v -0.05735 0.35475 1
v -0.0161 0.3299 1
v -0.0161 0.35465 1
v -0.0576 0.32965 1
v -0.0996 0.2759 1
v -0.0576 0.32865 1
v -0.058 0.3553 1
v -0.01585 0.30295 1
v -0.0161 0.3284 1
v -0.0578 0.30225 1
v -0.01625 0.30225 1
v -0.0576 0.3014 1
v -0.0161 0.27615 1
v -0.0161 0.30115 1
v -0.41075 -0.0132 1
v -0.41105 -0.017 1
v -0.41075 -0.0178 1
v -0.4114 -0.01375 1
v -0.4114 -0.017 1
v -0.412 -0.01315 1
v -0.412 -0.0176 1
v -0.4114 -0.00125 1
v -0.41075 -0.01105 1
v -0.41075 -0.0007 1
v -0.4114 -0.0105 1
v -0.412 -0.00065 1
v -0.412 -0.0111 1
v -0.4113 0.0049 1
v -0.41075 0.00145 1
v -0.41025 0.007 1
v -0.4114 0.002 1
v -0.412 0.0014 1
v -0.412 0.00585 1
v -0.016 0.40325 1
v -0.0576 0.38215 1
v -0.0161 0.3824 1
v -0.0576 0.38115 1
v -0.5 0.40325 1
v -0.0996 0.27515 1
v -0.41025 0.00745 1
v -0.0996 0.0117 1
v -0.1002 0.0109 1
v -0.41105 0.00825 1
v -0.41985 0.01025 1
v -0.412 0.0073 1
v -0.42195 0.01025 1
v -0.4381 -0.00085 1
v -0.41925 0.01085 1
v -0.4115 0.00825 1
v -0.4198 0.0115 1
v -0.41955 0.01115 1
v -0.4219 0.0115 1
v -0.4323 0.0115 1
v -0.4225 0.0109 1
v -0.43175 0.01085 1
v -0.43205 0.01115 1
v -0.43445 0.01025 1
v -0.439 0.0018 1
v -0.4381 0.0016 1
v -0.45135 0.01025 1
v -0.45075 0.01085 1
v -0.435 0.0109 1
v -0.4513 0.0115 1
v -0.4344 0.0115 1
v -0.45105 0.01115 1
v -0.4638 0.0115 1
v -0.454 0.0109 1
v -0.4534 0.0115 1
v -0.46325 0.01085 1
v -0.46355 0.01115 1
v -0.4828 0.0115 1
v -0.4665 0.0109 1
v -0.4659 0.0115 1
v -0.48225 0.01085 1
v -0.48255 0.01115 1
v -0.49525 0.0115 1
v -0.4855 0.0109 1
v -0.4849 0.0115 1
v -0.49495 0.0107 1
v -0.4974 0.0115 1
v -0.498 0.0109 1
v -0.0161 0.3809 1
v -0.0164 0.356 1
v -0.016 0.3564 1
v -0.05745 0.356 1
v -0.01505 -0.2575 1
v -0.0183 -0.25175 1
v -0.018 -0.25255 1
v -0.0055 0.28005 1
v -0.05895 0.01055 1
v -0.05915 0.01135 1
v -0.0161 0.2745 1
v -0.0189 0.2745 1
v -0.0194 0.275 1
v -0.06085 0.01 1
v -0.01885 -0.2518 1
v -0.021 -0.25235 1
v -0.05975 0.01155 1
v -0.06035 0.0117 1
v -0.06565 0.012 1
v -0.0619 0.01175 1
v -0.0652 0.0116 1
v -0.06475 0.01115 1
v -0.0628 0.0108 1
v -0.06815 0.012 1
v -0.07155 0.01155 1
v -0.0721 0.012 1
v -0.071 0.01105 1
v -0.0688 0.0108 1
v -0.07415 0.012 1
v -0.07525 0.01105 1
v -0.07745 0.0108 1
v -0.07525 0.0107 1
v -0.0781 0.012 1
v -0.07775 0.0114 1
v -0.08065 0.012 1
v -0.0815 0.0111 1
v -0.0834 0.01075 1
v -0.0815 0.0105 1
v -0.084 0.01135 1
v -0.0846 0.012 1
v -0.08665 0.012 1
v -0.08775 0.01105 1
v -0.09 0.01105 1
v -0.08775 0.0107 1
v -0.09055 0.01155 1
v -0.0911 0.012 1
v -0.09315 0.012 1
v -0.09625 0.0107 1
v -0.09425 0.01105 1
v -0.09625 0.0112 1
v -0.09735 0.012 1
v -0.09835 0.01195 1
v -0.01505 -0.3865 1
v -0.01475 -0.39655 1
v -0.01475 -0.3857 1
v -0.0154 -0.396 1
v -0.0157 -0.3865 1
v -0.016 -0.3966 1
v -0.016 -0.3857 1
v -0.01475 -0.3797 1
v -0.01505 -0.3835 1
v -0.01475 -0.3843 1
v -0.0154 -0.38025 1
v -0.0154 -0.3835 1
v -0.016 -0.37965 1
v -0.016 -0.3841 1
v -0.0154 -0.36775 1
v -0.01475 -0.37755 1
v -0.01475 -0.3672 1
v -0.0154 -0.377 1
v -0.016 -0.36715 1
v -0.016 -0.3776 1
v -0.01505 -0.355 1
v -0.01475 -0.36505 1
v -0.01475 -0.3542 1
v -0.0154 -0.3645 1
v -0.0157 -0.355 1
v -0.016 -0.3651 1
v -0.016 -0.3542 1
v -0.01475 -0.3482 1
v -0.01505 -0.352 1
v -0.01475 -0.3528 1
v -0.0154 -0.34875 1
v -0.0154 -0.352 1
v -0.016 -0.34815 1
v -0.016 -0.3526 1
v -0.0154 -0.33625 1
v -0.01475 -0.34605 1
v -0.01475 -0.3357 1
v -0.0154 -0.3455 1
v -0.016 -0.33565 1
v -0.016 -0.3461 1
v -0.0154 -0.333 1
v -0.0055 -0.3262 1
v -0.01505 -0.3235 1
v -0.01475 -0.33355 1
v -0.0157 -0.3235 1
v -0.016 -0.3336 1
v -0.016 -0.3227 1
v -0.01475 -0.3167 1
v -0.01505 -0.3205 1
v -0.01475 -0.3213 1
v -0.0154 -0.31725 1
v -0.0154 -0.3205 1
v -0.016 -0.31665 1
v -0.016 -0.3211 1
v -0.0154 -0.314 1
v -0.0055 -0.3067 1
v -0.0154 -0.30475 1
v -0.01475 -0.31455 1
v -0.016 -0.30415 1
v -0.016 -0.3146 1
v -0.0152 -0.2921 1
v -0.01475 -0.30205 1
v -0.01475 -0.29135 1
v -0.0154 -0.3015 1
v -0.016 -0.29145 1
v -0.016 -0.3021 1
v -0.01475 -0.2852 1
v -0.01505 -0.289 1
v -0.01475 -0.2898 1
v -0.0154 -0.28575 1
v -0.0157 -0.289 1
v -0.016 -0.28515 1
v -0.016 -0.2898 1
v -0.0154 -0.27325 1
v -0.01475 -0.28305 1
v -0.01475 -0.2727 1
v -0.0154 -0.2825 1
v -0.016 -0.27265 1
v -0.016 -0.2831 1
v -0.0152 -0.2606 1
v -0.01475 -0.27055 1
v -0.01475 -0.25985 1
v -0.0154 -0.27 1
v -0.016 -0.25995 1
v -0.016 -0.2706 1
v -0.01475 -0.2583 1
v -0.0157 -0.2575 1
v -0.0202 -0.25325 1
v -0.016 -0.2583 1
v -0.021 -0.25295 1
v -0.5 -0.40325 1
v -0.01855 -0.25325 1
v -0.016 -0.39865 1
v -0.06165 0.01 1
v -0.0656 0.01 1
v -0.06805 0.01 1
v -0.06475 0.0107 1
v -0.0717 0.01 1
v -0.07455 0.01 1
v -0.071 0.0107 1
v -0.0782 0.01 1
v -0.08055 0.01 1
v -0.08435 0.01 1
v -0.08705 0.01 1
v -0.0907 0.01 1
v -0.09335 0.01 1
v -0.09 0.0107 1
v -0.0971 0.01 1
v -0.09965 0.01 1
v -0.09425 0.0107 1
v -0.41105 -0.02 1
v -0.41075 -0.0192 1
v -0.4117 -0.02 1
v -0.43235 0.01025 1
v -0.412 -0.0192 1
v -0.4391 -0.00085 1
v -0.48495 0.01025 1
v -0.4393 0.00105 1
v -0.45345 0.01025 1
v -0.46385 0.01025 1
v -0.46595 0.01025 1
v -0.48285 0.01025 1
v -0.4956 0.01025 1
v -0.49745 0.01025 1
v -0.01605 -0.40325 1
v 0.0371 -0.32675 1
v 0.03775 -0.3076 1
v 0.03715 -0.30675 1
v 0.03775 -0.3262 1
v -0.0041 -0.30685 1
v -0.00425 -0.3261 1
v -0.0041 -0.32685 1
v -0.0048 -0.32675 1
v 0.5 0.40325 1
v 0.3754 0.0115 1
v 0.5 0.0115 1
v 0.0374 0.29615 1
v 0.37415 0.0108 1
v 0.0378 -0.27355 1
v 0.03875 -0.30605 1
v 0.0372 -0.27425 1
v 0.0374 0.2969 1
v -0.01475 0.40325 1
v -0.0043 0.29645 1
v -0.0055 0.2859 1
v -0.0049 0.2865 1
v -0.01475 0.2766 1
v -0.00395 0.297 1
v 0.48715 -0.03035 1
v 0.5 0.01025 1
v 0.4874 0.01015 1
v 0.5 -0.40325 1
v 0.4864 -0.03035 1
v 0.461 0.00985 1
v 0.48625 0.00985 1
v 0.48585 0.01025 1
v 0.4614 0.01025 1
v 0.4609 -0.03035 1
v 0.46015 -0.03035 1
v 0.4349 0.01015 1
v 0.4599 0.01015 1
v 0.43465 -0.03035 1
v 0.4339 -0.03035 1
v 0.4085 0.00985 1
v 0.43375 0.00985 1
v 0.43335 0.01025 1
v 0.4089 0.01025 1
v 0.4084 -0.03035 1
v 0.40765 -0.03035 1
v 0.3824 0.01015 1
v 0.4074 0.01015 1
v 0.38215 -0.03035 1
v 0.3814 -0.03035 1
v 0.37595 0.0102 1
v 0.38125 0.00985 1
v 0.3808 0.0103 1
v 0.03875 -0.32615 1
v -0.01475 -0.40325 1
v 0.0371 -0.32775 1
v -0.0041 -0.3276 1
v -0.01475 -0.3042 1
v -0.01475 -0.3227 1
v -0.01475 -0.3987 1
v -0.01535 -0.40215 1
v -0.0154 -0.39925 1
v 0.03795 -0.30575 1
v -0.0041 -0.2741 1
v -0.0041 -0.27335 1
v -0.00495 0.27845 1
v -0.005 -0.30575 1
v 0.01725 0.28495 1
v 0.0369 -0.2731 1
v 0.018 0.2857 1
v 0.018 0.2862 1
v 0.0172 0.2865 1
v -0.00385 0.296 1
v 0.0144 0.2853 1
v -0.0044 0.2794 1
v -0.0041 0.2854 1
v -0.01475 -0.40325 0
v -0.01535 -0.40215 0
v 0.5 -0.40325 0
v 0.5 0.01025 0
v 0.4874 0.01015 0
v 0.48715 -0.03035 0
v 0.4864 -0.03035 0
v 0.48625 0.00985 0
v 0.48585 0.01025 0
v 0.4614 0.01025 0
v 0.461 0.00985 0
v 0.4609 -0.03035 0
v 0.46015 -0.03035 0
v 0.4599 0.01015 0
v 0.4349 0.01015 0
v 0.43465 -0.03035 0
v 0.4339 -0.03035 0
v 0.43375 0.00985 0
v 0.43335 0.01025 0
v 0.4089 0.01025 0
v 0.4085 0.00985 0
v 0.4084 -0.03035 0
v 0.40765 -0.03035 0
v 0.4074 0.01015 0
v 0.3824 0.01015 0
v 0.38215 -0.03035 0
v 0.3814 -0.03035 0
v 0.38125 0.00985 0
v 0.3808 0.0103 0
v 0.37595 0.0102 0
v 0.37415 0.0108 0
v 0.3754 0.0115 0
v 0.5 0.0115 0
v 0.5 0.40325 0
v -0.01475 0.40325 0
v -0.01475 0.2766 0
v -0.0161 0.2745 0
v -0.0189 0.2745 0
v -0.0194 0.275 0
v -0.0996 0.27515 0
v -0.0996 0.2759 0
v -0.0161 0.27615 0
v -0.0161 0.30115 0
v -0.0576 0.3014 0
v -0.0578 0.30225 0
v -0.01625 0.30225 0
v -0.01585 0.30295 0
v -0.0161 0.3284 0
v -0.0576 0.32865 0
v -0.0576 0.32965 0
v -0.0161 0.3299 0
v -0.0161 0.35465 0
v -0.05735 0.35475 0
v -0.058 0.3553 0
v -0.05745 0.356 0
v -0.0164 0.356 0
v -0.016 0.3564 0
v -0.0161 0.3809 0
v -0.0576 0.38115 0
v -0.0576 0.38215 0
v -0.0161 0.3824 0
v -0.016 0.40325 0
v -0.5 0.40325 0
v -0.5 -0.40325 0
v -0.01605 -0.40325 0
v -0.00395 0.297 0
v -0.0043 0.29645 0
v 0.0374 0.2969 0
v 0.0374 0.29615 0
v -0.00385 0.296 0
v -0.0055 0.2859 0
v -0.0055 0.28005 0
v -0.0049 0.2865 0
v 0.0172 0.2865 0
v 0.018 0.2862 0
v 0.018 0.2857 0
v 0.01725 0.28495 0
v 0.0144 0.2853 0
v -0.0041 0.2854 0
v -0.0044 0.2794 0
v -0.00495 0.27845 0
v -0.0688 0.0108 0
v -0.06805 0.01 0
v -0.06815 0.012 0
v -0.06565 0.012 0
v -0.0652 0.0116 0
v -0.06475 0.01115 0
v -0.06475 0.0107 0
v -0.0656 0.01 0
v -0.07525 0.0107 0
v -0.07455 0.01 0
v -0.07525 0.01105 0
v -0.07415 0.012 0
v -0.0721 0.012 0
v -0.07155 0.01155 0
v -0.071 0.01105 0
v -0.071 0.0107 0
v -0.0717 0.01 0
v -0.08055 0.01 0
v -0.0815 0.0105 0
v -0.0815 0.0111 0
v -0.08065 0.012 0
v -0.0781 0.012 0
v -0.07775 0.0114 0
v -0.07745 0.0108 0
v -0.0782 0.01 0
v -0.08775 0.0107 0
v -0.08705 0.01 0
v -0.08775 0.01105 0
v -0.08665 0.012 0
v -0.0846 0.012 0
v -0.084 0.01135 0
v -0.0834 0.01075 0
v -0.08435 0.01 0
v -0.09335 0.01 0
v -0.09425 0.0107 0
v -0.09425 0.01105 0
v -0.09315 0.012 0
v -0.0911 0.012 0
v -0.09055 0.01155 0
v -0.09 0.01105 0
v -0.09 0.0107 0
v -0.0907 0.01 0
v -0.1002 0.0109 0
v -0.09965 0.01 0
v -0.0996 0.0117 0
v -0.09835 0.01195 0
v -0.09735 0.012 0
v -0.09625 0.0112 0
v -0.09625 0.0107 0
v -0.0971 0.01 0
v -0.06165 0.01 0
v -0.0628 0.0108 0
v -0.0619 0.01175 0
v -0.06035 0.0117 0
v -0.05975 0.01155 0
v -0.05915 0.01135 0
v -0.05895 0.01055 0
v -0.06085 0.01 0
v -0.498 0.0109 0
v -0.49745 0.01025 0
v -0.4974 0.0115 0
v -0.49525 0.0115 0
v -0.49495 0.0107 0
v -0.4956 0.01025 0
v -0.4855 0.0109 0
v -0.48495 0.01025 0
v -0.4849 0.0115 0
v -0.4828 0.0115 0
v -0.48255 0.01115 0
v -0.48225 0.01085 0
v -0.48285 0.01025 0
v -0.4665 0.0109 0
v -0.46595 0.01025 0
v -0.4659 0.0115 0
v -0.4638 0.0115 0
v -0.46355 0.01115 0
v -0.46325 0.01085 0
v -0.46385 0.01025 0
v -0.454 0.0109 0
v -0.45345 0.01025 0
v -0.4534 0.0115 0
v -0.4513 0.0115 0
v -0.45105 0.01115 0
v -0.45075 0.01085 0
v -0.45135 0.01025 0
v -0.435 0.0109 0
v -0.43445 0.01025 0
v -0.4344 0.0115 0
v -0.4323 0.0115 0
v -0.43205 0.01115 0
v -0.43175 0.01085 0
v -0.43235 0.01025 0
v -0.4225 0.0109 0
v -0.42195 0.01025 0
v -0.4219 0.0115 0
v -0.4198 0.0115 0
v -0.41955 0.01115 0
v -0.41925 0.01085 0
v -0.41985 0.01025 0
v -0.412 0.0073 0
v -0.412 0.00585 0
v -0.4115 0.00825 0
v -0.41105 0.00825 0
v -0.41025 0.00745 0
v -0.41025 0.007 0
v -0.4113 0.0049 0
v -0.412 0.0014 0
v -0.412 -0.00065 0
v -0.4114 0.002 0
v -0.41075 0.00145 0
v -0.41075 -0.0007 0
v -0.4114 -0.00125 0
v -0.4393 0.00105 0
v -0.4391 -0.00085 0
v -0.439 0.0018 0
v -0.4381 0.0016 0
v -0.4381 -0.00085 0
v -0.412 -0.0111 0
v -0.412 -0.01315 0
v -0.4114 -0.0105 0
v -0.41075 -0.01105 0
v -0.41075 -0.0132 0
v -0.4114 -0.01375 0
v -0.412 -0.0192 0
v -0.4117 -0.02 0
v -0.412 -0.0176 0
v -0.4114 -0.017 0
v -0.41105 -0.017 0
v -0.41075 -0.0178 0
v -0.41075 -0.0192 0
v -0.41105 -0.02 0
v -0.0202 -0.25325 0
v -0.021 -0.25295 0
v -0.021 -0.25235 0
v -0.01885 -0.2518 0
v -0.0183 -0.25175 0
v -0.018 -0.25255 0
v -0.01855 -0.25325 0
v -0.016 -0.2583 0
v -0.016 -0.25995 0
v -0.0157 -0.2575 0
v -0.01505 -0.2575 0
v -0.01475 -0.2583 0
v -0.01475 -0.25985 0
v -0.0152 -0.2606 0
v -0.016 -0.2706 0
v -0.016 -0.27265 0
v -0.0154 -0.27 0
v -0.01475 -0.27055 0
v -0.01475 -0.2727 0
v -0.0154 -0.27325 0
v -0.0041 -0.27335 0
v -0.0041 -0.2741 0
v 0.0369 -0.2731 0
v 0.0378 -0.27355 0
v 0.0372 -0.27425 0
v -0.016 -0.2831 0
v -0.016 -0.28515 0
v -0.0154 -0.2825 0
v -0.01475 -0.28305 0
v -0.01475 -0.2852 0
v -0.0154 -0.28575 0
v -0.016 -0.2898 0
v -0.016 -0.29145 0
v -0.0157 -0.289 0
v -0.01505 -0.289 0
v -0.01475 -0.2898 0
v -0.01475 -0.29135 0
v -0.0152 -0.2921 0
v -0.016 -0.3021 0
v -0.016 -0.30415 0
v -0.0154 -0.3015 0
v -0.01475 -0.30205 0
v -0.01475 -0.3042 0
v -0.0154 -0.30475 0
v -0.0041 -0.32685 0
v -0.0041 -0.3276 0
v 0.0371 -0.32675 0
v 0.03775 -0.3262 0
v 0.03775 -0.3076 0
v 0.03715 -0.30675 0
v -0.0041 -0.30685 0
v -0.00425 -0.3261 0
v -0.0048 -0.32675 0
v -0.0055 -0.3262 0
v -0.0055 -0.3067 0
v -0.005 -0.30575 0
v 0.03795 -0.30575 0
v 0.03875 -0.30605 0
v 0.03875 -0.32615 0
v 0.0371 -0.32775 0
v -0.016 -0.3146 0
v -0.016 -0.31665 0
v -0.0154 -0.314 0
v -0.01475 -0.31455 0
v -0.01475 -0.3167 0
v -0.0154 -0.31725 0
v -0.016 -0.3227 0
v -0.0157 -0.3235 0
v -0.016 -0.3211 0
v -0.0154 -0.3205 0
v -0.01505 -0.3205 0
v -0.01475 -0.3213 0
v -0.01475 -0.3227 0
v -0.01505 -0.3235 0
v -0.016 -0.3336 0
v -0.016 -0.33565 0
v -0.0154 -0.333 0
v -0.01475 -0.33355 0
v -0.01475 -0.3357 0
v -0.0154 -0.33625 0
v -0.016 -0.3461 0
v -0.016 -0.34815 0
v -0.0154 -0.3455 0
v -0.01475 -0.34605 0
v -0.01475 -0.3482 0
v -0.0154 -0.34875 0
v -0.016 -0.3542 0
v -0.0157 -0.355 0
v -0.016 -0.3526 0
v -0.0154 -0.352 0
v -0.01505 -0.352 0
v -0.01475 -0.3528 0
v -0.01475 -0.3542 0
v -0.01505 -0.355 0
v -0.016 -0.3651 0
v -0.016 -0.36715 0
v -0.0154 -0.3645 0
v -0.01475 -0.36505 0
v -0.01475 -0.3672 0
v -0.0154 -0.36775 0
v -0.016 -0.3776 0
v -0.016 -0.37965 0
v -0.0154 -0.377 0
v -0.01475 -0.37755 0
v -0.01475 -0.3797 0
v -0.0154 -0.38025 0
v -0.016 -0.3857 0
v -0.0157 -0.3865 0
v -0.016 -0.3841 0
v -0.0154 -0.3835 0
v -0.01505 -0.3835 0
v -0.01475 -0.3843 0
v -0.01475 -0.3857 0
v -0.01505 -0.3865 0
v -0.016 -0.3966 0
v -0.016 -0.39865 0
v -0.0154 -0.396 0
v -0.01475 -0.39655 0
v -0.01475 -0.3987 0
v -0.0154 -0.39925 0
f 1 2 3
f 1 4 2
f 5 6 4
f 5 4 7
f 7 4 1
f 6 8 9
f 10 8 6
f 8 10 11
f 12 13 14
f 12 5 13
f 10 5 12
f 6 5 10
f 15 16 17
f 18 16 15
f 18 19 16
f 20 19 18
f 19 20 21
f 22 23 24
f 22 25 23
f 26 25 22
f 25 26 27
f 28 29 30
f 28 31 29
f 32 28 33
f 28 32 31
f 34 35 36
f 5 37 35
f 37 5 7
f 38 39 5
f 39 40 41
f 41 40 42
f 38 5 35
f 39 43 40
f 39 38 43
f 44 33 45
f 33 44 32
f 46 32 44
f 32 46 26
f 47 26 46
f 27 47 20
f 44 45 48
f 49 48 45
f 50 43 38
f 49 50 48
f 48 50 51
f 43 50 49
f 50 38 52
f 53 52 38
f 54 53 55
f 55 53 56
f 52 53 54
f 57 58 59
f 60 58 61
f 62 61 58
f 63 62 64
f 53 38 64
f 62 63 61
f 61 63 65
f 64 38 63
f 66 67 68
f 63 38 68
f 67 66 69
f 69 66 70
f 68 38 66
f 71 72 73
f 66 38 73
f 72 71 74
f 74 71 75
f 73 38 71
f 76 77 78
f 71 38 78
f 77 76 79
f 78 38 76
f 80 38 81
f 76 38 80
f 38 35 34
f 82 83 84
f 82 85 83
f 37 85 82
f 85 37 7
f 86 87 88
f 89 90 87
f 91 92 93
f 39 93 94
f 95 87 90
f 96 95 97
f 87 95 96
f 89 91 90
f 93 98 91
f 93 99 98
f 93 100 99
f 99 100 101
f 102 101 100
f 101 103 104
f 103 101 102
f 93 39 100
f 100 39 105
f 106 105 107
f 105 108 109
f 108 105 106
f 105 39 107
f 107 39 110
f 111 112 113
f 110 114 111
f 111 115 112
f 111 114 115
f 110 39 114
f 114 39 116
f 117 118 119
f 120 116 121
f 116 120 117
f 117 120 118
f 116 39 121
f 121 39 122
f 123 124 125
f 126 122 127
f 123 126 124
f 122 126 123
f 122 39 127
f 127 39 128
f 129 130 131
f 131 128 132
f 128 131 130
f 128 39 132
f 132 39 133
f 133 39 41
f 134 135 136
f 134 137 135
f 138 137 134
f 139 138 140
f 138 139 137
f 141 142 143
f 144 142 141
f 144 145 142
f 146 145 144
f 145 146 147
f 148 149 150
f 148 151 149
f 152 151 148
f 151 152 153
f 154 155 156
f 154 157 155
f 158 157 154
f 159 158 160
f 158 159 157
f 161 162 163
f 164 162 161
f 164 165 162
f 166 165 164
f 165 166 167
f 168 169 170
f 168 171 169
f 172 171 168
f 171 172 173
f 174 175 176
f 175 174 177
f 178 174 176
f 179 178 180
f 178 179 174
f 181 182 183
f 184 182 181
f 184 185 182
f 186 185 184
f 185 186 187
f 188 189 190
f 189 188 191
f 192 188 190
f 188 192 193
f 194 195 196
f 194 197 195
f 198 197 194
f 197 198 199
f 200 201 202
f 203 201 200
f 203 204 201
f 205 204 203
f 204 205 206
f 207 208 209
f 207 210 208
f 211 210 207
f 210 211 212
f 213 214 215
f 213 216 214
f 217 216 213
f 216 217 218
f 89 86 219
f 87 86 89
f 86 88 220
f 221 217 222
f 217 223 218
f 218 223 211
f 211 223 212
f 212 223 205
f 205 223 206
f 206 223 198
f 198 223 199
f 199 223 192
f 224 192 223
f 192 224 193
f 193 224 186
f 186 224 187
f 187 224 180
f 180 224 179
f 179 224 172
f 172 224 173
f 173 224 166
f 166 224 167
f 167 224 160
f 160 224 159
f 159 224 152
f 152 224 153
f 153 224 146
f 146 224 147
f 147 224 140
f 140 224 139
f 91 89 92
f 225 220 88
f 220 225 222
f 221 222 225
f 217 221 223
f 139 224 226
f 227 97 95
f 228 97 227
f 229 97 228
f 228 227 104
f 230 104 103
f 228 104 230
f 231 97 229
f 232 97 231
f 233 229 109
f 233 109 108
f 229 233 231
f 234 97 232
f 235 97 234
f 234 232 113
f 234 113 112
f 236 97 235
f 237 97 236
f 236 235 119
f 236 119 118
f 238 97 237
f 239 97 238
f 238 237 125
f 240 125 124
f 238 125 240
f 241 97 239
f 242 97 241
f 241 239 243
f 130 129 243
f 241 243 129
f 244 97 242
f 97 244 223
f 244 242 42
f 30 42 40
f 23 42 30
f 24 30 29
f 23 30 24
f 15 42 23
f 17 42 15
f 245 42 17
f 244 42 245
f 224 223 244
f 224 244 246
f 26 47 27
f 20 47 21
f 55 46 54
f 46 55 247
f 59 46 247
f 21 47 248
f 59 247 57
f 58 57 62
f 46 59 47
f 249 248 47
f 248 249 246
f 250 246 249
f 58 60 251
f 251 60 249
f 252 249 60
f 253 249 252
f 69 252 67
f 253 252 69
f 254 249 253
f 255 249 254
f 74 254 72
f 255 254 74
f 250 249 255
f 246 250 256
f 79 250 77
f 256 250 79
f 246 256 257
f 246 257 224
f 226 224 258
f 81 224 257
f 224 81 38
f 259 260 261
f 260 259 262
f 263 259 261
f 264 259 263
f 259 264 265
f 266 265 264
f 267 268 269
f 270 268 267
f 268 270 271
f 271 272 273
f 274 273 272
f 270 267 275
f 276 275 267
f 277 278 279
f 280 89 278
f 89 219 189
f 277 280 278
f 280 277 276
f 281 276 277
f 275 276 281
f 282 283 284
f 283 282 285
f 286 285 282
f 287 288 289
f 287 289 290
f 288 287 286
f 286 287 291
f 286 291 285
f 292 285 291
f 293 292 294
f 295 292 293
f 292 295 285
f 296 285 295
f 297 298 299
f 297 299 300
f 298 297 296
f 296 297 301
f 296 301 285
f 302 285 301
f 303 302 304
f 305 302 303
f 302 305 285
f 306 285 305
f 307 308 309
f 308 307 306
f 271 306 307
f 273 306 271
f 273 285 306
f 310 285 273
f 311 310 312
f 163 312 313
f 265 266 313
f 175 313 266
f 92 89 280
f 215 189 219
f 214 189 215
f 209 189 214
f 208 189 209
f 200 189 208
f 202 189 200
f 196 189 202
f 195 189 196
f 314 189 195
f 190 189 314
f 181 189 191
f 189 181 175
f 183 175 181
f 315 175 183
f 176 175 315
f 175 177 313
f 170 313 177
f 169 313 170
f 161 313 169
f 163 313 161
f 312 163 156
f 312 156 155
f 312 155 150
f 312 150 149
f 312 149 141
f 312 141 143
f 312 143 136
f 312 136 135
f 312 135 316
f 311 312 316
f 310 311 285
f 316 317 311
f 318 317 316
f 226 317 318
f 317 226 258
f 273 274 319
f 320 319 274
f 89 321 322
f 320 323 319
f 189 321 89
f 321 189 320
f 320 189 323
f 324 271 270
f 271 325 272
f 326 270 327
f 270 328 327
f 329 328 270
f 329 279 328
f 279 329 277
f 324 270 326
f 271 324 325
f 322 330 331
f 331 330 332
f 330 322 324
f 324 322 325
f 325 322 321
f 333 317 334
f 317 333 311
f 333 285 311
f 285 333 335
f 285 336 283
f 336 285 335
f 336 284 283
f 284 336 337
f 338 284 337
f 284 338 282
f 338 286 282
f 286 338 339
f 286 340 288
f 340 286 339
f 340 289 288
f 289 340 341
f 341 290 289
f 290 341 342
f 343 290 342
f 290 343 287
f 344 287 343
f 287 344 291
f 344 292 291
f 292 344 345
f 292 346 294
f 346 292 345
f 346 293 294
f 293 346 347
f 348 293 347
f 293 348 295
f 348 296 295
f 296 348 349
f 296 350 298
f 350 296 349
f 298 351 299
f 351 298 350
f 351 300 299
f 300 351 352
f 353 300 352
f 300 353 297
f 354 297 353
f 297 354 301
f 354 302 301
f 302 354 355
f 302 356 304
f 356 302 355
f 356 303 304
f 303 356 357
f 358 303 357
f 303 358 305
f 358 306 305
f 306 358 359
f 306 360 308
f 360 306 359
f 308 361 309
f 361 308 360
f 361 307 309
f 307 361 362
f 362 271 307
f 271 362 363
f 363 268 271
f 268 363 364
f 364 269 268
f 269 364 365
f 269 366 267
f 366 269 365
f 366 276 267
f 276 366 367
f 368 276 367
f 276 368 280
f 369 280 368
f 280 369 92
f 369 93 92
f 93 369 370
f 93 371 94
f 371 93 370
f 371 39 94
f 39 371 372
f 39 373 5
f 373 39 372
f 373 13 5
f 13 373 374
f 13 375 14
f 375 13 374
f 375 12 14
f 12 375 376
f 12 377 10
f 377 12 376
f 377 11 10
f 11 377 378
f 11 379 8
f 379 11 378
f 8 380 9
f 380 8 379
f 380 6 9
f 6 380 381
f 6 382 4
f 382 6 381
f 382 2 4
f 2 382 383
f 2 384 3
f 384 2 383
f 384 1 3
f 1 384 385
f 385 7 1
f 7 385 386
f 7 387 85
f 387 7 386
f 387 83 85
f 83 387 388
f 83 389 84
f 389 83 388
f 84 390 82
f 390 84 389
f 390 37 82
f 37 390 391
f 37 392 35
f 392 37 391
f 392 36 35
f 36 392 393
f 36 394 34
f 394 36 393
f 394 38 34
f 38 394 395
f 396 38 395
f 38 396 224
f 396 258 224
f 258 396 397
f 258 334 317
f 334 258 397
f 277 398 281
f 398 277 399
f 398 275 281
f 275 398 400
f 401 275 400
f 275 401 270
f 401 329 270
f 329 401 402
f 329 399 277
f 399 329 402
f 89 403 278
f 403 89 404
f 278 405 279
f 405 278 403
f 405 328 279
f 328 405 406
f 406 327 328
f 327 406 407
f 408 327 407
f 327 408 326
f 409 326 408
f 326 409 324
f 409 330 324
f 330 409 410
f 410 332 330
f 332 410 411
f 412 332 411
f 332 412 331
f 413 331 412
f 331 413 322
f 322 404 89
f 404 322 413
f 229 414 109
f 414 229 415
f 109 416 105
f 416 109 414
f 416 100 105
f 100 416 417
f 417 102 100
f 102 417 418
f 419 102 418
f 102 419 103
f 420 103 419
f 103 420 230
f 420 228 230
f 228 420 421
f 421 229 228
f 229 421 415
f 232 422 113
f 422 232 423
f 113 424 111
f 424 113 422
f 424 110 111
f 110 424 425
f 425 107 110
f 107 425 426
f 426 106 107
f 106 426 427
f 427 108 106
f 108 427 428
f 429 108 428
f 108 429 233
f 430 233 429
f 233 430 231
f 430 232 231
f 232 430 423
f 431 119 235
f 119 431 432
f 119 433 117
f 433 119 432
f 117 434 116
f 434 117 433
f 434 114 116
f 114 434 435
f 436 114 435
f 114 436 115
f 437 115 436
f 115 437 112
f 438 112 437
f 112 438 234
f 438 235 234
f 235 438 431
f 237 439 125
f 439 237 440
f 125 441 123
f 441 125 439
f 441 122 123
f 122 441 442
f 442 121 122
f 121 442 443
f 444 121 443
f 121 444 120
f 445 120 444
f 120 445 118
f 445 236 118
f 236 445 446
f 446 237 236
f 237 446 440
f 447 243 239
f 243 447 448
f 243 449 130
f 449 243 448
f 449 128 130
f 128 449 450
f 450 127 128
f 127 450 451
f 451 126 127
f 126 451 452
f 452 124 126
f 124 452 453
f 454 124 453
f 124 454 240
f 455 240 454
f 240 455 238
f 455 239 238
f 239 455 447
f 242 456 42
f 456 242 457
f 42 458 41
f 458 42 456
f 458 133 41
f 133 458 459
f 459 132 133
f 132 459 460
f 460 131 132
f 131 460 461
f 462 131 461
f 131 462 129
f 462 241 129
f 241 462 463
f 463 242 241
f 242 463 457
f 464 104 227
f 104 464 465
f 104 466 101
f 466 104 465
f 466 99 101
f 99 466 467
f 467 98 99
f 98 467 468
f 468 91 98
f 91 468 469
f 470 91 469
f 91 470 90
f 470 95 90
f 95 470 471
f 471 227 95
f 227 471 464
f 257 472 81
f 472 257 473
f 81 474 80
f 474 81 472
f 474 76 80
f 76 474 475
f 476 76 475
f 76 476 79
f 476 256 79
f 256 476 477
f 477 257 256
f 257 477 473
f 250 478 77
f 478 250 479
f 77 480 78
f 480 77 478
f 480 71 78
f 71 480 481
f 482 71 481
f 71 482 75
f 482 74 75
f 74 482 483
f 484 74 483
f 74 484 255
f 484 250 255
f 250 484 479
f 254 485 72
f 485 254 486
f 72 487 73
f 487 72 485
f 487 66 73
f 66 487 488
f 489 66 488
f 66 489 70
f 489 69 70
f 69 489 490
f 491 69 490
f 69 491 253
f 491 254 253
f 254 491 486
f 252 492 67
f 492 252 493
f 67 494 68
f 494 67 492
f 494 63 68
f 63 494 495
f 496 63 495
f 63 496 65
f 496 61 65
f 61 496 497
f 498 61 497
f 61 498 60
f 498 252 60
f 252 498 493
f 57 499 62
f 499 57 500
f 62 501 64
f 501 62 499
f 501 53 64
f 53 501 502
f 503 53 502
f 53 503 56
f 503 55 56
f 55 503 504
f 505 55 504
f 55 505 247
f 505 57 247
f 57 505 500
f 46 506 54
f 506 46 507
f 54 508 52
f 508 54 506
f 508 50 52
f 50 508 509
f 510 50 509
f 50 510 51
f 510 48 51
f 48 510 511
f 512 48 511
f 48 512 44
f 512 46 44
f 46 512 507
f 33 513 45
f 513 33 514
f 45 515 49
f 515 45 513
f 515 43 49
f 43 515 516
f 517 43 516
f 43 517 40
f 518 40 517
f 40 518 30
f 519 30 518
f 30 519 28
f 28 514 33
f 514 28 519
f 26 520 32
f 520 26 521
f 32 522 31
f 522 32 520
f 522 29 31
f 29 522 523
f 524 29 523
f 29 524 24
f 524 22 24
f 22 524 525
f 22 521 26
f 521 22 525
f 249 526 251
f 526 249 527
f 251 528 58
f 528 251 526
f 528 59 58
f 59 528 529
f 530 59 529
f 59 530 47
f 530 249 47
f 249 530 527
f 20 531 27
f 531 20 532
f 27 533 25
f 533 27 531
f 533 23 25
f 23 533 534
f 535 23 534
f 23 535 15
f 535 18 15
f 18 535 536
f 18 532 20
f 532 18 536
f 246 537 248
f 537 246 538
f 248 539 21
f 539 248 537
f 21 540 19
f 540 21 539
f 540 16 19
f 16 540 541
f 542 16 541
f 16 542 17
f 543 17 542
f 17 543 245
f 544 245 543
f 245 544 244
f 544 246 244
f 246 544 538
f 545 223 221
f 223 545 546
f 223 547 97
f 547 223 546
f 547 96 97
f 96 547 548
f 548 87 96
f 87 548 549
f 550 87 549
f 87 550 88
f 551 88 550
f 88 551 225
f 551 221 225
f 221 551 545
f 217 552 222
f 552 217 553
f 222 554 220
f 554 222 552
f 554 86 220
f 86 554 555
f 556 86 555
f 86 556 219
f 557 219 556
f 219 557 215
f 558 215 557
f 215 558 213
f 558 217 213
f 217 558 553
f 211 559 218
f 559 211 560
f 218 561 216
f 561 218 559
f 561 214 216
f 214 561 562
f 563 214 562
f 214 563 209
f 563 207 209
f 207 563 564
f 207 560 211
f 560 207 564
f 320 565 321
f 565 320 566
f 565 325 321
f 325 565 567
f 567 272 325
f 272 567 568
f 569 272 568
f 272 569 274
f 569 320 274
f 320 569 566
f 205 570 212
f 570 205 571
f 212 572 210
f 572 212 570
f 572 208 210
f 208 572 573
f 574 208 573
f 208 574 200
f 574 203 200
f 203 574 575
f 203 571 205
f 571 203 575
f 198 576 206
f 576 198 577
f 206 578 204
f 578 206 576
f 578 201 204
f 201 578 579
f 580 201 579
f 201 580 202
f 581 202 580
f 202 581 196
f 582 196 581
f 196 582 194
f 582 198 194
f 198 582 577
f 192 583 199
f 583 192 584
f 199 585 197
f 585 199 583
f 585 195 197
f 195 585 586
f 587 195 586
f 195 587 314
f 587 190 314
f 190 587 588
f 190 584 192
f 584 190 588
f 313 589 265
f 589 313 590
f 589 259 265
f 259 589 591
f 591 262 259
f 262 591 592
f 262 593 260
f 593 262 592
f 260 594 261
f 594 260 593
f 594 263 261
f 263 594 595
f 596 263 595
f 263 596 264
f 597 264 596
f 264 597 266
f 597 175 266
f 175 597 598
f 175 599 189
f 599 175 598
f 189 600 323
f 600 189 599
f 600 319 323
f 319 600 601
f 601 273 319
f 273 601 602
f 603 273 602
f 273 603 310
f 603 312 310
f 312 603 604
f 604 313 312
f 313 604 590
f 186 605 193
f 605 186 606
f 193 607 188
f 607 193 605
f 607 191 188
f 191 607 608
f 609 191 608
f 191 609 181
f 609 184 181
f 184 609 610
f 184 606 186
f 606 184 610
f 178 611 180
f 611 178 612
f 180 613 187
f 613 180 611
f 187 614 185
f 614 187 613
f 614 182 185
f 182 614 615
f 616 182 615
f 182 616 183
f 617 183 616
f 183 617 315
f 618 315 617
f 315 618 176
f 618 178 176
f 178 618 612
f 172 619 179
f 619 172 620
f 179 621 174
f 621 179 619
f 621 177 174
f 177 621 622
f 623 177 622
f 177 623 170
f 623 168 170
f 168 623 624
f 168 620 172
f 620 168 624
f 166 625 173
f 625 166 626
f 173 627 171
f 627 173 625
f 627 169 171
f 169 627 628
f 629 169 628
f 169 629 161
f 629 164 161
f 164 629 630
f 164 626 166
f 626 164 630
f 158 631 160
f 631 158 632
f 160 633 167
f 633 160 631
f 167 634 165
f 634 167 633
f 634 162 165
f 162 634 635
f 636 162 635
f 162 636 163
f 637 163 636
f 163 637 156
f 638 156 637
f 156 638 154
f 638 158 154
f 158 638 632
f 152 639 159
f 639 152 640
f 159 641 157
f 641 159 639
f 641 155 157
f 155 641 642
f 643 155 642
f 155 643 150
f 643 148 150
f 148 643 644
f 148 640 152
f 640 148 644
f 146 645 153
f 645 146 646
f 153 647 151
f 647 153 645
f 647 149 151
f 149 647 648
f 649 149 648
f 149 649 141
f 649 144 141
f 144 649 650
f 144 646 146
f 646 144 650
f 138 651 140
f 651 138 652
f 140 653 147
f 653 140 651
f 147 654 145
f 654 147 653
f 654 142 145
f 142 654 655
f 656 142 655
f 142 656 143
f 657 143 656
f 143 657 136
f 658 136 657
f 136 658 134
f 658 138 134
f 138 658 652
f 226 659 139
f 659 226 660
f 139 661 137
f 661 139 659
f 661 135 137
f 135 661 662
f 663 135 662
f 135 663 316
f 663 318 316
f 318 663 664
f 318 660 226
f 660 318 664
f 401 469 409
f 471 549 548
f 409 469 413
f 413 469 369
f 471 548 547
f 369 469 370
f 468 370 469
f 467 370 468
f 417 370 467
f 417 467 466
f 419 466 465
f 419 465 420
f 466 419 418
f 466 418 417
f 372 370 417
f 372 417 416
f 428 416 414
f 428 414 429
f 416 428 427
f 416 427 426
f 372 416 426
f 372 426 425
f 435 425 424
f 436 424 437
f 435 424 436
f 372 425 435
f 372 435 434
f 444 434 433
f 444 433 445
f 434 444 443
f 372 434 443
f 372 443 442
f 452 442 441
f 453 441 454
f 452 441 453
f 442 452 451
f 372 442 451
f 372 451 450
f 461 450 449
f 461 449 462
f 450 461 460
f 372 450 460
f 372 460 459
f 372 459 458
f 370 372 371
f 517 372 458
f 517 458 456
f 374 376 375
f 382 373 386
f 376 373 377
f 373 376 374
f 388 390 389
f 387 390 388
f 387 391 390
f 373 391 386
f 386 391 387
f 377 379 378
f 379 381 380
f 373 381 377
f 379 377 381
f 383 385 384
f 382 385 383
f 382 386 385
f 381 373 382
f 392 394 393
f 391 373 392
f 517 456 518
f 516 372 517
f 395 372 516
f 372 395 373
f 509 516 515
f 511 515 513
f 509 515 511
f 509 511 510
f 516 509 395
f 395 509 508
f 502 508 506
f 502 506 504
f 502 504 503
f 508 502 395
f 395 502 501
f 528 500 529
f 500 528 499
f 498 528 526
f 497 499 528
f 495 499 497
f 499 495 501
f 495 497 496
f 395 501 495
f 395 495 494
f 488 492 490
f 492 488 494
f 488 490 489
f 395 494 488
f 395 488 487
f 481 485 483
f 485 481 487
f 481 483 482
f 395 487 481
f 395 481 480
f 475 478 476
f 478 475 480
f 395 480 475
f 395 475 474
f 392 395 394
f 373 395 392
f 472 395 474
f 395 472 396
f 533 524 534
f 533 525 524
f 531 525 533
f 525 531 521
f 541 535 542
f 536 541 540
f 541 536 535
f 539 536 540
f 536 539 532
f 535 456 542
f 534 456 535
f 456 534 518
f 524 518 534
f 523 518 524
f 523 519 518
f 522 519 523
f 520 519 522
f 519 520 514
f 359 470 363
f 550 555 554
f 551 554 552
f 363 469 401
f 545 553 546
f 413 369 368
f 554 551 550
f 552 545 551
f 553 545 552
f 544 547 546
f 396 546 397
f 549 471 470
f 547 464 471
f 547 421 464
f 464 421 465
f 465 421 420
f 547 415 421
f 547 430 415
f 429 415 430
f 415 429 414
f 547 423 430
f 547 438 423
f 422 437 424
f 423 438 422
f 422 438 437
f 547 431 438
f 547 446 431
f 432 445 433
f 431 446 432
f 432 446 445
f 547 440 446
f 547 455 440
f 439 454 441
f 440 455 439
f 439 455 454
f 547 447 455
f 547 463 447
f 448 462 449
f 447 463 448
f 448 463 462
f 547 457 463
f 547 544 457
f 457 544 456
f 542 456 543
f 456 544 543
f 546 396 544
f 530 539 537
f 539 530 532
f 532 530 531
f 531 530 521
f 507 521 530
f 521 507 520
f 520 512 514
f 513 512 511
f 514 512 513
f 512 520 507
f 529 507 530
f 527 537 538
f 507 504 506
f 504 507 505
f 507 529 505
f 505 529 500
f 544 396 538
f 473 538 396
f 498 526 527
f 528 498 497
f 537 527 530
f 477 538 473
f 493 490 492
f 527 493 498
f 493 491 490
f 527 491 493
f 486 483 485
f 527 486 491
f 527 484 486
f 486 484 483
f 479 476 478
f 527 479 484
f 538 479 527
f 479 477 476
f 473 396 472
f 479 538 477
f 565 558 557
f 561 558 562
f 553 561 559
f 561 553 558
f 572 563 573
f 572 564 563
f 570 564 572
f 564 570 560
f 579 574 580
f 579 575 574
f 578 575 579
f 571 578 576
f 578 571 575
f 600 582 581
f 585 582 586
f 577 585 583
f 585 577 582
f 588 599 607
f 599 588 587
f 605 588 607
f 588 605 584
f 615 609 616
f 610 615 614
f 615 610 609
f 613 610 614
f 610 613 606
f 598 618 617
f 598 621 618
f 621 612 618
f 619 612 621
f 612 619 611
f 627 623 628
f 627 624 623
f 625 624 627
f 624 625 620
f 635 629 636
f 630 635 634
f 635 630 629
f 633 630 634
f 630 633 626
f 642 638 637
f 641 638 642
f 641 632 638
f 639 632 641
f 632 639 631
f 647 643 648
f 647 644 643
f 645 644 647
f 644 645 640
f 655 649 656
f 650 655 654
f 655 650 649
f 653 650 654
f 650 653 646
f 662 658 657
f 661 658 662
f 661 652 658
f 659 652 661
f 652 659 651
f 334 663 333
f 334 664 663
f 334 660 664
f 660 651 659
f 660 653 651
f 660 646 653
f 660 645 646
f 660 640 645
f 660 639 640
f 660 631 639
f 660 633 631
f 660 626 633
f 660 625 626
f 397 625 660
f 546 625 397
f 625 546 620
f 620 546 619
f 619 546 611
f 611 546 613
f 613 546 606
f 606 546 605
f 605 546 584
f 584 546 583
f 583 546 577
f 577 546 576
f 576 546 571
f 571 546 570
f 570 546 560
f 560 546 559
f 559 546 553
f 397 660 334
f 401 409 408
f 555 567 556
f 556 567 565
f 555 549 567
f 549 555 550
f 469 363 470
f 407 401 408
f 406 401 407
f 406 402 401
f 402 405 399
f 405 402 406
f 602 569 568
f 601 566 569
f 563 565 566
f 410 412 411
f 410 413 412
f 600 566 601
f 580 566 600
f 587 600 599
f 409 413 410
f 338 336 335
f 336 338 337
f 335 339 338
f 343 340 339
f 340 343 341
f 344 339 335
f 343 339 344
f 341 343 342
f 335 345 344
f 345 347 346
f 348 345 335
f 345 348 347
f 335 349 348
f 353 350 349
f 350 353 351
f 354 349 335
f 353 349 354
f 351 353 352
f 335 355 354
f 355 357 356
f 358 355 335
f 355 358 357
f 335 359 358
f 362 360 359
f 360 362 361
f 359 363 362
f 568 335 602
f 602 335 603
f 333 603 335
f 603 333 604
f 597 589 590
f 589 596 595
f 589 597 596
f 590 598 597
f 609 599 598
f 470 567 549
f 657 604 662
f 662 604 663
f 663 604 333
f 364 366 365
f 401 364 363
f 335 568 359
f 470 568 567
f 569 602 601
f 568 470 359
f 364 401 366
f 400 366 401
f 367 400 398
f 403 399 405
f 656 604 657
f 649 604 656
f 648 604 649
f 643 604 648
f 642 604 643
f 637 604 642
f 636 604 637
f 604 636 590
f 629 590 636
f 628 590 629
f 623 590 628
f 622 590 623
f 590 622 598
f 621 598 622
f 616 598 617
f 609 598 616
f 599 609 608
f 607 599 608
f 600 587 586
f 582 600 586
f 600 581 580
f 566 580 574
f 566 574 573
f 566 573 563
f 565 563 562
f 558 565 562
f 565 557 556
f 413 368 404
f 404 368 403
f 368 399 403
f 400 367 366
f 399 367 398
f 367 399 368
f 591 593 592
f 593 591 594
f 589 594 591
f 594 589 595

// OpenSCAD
module tear2_1()
{
 /* Generated by trace2scad version 20150415
    http://aggregate.org/MAKE/TRACE2SCAD/
    Optimized model has 359/680 original points
 */
 color([0.5, 0.5, 0.5])
 assign(minx=0) /* polygon minx=0 */
 assign(miny=0) /* polygon miny=0 */
 assign(maxx=20000) /* polygon maxx=20000 */
 assign(maxy=16130) /* polygon maxy=16130 */
 assign(dx=maxx-minx)
 assign(dy=maxy-miny)
 assign(maxd=((dx>dy)?dx:dy))
 scale([1/maxd, 1/maxd, 1])
 translate([-minx-dx/2, -miny-dy/2, 0])
 linear_extrude(height=1, convexity=359)
 union() {
  union() {
   union() {
    difference() {
     polygon([[0,8065],[0,0],[9679,0],[9693,22],[9705,0],[20000,0],[20000,8270],[19748,8268],[19743,7458],[19728,7458],[19725,8262],[19717,8270],[19228,8270],[19220,8262],[19218,7458],[19203,7458],[19198,8268],[18698,8268],[18693,7458],[18678,7458],[18675,8262],[18667,8270],[18178,8270],[18170,8262],[18168,7458],[18153,7458],[18148,8268],[17648,8268],[17643,7458],[17628,7458],[17625,8262],[17616,8271],[17519,8269],[17483,8281],[17508,8295],[20000,8295],[20000,16130],[9705,16130],[9705,13597],[9678,13555],[9622,13555],[9612,13565],[8008,13568],[8008,13583],[9678,13588],[9678,14088],[8848,14093],[8844,14110],[9675,14110],[9683,14124],[9678,14633],[8848,14638],[8848,14658],[9678,14663],[9678,15158],[8853,15160],[8840,15171],[8851,15185],[9672,15185],[9680,15193],[9678,15683],[8848,15688],[8848,15708],[9678,15713],[9680,16130],[0,16130]], convexity=33);
     polygon([[10748,13995],[10748,13988],[9923,13985],[9914,13994],[9921,14005],[10748,14003]], convexity=7);
     polygon([[10352,13792],[10360,13789],[10360,13779],[10345,13764],[10288,13771],[9918,13773],[9912,13653],[9901,13634],[9890,13666],[9890,13783],[9902,13795],[10344,13795]], convexity=8);
     polygon([[8064,8297],[8075,8289],[8075,8279],[8058,8265],[8007,8265],[7996,8283],[8008,8299],[8033,8304],[8053,8305]], convexity=6);
     polygon([[8189,8296],[8200,8286],[8200,8279],[8186,8265],[8133,8265],[8115,8279],[8115,8286],[8137,8305],[8178,8305]], convexity=6);
     polygon([[8320,8292],[8332,8280],[8313,8265],[8259,8265],[8245,8279],[8245,8286],[8267,8305],[8308,8305]], convexity=6);
     polygon([[8445,8293],[8451,8281],[8436,8265],[8389,8265],[8370,8275],[8370,8287],[8387,8305],[8438,8305]], convexity=6);
     polygon([[8569,8296],[8580,8286],[8580,8279],[8566,8265],[8509,8265],[8495,8279],[8495,8286],[8517,8305],[8558,8305]], convexity=6);
     polygon([[8696,8297],[8705,8288],[8705,8279],[8688,8265],[8639,8265],[8624,8281],[8637,8305],[8687,8305]], convexity=6);
     polygon([[8805,8296],[8817,8292],[8821,8276],[8783,8265],[8767,8265],[8744,8281],[8762,8300],[8793,8299]], convexity=7);
     polygon([[98,8287],[101,8279],[88,8270],[51,8270],[40,8283],[52,8295],[95,8295]], convexity=6);
     polygon([[349,8288],[355,8282],[343,8270],[301,8270],[290,8283],[302,8295],[344,8295]], convexity=6);
     polygon([[729,8288],[735,8282],[723,8270],[681,8270],[670,8283],[682,8295],[724,8295]], convexity=6);
     polygon([[979,8288],[985,8282],[973,8270],[931,8270],[920,8283],[932,8295],[974,8295]], convexity=6);
     polygon([[1359,8288],[1365,8282],[1353,8270],[1311,8270],[1300,8283],[1312,8295],[1354,8295]], convexity=6);
     polygon([[1609,8288],[1615,8282],[1603,8270],[1561,8270],[1550,8283],[1562,8295],[1604,8295]], convexity=6);
     polygon([[1787,8222],[1795,8214],[1795,8205],[1774,8163],[1760,8182],[1760,8211],[1770,8230],[1779,8230]], convexity=6);
     polygon([[1785,8073],[1785,8051],[1772,8040],[1760,8052],[1760,8093],[1772,8105],[1785,8094]], convexity=7);
     polygon([[1238,8072],[1238,8048],[1218,8048],[1214,8086],[1220,8101],[1238,8097]], convexity=6);
     polygon([[1785,7823],[1785,7801],[1772,7790],[1760,7802],[1760,7843],[1772,7855],[1785,7844]], convexity=7);
     polygon([[1782,7717],[1785,7709],[1785,7681],[1779,7665],[1766,7665],[1760,7681],[1760,7713],[1772,7725],[1779,7725]], convexity=6);
     polygon([[9637,3022],[9640,3014],[9629,3000],[9596,3000],[9580,3006],[9580,3018],[9623,3029],[9634,3030]], convexity=6);
     polygon([[9702,2907],[9705,2899],[9705,2868],[9696,2853],[9680,2866],[9680,2899],[9686,2915],[9699,2915]], convexity=6);
     polygon([[9705,2633],[9705,2611],[9692,2600],[9680,2612],[9680,2653],[9692,2665],[9705,2654]], convexity=7);
     polygon([[10750,2587],[10744,2580],[9918,2583],[9918,2598],[10738,2603],[10756,2594]], convexity=6);
     polygon([[9705,2383],[9705,2361],[9692,2350],[9680,2362],[9680,2403],[9692,2415],[9705,2404]], convexity=7);
     polygon([[9702,2277],[9705,2269],[9705,2238],[9696,2223],[9680,2236],[9680,2269],[9686,2285],[9699,2285]], convexity=6);
     polygon([[9705,2003],[9705,1981],[9692,1970],[9680,1982],[9680,2023],[9692,2035],[9705,2024]], convexity=7);
     polygon([[10767,1947],[10775,1944],[10775,1542],[10742,1510],[9918,1513],[9918,1528],[10742,1530],[10755,1541],[10755,1913],[10743,1930],[9918,1928],[9915,1543],[9904,1530],[9890,1541],[9890,1931],[9900,1950],[10759,1950]], convexity=10);
     polygon([[9705,1753],[9705,1731],[9692,1720],[9680,1732],[9680,1773],[9692,1785],[9705,1774]], convexity=7);
     polygon([[9702,1647],[9705,1639],[9705,1611],[9699,1595],[9686,1595],[9680,1611],[9680,1643],[9692,1655],[9699,1655]], convexity=6);
     polygon([[9705,1373],[9705,1351],[9692,1340],[9680,1352],[9680,1393],[9692,1405],[9705,1394]], convexity=7);
     polygon([[9705,1123],[9705,1101],[9692,1090],[9680,1102],[9680,1143],[9692,1155],[9705,1144]], convexity=7);
     polygon([[9702,1017],[9705,1009],[9705,981],[9699,965],[9686,965],[9680,981],[9680,1013],[9692,1025],[9699,1025]], convexity=6);
     polygon([[9705,743],[9705,721],[9692,710],[9680,722],[9680,763],[9692,775],[9705,764]], convexity=7);
     polygon([[9705,493],[9705,471],[9692,460],[9680,472],[9680,513],[9692,525],[9705,514]], convexity=7);
     polygon([[9702,387],[9705,379],[9705,351],[9699,335],[9686,335],[9680,351],[9680,383],[9692,395],[9699,395]], convexity=6);
     polygon([[9705,113],[9705,91],[9692,80],[9680,92],[9680,133],[9692,145],[9705,134]], convexity=7);
    }
   }
  }
 }
}

module tear2()
{
 /* all layers combined, scaled to within a 1mm cube */
 scale([1, 1, 1/1])
 difference() {
  union() {
   scale([1,1,2]) translate([0,0,-0.5]) tear2_1();
  }
  translate([0,0,-2]) cube([2,2,4],center=true);
 }
}
tear2();
